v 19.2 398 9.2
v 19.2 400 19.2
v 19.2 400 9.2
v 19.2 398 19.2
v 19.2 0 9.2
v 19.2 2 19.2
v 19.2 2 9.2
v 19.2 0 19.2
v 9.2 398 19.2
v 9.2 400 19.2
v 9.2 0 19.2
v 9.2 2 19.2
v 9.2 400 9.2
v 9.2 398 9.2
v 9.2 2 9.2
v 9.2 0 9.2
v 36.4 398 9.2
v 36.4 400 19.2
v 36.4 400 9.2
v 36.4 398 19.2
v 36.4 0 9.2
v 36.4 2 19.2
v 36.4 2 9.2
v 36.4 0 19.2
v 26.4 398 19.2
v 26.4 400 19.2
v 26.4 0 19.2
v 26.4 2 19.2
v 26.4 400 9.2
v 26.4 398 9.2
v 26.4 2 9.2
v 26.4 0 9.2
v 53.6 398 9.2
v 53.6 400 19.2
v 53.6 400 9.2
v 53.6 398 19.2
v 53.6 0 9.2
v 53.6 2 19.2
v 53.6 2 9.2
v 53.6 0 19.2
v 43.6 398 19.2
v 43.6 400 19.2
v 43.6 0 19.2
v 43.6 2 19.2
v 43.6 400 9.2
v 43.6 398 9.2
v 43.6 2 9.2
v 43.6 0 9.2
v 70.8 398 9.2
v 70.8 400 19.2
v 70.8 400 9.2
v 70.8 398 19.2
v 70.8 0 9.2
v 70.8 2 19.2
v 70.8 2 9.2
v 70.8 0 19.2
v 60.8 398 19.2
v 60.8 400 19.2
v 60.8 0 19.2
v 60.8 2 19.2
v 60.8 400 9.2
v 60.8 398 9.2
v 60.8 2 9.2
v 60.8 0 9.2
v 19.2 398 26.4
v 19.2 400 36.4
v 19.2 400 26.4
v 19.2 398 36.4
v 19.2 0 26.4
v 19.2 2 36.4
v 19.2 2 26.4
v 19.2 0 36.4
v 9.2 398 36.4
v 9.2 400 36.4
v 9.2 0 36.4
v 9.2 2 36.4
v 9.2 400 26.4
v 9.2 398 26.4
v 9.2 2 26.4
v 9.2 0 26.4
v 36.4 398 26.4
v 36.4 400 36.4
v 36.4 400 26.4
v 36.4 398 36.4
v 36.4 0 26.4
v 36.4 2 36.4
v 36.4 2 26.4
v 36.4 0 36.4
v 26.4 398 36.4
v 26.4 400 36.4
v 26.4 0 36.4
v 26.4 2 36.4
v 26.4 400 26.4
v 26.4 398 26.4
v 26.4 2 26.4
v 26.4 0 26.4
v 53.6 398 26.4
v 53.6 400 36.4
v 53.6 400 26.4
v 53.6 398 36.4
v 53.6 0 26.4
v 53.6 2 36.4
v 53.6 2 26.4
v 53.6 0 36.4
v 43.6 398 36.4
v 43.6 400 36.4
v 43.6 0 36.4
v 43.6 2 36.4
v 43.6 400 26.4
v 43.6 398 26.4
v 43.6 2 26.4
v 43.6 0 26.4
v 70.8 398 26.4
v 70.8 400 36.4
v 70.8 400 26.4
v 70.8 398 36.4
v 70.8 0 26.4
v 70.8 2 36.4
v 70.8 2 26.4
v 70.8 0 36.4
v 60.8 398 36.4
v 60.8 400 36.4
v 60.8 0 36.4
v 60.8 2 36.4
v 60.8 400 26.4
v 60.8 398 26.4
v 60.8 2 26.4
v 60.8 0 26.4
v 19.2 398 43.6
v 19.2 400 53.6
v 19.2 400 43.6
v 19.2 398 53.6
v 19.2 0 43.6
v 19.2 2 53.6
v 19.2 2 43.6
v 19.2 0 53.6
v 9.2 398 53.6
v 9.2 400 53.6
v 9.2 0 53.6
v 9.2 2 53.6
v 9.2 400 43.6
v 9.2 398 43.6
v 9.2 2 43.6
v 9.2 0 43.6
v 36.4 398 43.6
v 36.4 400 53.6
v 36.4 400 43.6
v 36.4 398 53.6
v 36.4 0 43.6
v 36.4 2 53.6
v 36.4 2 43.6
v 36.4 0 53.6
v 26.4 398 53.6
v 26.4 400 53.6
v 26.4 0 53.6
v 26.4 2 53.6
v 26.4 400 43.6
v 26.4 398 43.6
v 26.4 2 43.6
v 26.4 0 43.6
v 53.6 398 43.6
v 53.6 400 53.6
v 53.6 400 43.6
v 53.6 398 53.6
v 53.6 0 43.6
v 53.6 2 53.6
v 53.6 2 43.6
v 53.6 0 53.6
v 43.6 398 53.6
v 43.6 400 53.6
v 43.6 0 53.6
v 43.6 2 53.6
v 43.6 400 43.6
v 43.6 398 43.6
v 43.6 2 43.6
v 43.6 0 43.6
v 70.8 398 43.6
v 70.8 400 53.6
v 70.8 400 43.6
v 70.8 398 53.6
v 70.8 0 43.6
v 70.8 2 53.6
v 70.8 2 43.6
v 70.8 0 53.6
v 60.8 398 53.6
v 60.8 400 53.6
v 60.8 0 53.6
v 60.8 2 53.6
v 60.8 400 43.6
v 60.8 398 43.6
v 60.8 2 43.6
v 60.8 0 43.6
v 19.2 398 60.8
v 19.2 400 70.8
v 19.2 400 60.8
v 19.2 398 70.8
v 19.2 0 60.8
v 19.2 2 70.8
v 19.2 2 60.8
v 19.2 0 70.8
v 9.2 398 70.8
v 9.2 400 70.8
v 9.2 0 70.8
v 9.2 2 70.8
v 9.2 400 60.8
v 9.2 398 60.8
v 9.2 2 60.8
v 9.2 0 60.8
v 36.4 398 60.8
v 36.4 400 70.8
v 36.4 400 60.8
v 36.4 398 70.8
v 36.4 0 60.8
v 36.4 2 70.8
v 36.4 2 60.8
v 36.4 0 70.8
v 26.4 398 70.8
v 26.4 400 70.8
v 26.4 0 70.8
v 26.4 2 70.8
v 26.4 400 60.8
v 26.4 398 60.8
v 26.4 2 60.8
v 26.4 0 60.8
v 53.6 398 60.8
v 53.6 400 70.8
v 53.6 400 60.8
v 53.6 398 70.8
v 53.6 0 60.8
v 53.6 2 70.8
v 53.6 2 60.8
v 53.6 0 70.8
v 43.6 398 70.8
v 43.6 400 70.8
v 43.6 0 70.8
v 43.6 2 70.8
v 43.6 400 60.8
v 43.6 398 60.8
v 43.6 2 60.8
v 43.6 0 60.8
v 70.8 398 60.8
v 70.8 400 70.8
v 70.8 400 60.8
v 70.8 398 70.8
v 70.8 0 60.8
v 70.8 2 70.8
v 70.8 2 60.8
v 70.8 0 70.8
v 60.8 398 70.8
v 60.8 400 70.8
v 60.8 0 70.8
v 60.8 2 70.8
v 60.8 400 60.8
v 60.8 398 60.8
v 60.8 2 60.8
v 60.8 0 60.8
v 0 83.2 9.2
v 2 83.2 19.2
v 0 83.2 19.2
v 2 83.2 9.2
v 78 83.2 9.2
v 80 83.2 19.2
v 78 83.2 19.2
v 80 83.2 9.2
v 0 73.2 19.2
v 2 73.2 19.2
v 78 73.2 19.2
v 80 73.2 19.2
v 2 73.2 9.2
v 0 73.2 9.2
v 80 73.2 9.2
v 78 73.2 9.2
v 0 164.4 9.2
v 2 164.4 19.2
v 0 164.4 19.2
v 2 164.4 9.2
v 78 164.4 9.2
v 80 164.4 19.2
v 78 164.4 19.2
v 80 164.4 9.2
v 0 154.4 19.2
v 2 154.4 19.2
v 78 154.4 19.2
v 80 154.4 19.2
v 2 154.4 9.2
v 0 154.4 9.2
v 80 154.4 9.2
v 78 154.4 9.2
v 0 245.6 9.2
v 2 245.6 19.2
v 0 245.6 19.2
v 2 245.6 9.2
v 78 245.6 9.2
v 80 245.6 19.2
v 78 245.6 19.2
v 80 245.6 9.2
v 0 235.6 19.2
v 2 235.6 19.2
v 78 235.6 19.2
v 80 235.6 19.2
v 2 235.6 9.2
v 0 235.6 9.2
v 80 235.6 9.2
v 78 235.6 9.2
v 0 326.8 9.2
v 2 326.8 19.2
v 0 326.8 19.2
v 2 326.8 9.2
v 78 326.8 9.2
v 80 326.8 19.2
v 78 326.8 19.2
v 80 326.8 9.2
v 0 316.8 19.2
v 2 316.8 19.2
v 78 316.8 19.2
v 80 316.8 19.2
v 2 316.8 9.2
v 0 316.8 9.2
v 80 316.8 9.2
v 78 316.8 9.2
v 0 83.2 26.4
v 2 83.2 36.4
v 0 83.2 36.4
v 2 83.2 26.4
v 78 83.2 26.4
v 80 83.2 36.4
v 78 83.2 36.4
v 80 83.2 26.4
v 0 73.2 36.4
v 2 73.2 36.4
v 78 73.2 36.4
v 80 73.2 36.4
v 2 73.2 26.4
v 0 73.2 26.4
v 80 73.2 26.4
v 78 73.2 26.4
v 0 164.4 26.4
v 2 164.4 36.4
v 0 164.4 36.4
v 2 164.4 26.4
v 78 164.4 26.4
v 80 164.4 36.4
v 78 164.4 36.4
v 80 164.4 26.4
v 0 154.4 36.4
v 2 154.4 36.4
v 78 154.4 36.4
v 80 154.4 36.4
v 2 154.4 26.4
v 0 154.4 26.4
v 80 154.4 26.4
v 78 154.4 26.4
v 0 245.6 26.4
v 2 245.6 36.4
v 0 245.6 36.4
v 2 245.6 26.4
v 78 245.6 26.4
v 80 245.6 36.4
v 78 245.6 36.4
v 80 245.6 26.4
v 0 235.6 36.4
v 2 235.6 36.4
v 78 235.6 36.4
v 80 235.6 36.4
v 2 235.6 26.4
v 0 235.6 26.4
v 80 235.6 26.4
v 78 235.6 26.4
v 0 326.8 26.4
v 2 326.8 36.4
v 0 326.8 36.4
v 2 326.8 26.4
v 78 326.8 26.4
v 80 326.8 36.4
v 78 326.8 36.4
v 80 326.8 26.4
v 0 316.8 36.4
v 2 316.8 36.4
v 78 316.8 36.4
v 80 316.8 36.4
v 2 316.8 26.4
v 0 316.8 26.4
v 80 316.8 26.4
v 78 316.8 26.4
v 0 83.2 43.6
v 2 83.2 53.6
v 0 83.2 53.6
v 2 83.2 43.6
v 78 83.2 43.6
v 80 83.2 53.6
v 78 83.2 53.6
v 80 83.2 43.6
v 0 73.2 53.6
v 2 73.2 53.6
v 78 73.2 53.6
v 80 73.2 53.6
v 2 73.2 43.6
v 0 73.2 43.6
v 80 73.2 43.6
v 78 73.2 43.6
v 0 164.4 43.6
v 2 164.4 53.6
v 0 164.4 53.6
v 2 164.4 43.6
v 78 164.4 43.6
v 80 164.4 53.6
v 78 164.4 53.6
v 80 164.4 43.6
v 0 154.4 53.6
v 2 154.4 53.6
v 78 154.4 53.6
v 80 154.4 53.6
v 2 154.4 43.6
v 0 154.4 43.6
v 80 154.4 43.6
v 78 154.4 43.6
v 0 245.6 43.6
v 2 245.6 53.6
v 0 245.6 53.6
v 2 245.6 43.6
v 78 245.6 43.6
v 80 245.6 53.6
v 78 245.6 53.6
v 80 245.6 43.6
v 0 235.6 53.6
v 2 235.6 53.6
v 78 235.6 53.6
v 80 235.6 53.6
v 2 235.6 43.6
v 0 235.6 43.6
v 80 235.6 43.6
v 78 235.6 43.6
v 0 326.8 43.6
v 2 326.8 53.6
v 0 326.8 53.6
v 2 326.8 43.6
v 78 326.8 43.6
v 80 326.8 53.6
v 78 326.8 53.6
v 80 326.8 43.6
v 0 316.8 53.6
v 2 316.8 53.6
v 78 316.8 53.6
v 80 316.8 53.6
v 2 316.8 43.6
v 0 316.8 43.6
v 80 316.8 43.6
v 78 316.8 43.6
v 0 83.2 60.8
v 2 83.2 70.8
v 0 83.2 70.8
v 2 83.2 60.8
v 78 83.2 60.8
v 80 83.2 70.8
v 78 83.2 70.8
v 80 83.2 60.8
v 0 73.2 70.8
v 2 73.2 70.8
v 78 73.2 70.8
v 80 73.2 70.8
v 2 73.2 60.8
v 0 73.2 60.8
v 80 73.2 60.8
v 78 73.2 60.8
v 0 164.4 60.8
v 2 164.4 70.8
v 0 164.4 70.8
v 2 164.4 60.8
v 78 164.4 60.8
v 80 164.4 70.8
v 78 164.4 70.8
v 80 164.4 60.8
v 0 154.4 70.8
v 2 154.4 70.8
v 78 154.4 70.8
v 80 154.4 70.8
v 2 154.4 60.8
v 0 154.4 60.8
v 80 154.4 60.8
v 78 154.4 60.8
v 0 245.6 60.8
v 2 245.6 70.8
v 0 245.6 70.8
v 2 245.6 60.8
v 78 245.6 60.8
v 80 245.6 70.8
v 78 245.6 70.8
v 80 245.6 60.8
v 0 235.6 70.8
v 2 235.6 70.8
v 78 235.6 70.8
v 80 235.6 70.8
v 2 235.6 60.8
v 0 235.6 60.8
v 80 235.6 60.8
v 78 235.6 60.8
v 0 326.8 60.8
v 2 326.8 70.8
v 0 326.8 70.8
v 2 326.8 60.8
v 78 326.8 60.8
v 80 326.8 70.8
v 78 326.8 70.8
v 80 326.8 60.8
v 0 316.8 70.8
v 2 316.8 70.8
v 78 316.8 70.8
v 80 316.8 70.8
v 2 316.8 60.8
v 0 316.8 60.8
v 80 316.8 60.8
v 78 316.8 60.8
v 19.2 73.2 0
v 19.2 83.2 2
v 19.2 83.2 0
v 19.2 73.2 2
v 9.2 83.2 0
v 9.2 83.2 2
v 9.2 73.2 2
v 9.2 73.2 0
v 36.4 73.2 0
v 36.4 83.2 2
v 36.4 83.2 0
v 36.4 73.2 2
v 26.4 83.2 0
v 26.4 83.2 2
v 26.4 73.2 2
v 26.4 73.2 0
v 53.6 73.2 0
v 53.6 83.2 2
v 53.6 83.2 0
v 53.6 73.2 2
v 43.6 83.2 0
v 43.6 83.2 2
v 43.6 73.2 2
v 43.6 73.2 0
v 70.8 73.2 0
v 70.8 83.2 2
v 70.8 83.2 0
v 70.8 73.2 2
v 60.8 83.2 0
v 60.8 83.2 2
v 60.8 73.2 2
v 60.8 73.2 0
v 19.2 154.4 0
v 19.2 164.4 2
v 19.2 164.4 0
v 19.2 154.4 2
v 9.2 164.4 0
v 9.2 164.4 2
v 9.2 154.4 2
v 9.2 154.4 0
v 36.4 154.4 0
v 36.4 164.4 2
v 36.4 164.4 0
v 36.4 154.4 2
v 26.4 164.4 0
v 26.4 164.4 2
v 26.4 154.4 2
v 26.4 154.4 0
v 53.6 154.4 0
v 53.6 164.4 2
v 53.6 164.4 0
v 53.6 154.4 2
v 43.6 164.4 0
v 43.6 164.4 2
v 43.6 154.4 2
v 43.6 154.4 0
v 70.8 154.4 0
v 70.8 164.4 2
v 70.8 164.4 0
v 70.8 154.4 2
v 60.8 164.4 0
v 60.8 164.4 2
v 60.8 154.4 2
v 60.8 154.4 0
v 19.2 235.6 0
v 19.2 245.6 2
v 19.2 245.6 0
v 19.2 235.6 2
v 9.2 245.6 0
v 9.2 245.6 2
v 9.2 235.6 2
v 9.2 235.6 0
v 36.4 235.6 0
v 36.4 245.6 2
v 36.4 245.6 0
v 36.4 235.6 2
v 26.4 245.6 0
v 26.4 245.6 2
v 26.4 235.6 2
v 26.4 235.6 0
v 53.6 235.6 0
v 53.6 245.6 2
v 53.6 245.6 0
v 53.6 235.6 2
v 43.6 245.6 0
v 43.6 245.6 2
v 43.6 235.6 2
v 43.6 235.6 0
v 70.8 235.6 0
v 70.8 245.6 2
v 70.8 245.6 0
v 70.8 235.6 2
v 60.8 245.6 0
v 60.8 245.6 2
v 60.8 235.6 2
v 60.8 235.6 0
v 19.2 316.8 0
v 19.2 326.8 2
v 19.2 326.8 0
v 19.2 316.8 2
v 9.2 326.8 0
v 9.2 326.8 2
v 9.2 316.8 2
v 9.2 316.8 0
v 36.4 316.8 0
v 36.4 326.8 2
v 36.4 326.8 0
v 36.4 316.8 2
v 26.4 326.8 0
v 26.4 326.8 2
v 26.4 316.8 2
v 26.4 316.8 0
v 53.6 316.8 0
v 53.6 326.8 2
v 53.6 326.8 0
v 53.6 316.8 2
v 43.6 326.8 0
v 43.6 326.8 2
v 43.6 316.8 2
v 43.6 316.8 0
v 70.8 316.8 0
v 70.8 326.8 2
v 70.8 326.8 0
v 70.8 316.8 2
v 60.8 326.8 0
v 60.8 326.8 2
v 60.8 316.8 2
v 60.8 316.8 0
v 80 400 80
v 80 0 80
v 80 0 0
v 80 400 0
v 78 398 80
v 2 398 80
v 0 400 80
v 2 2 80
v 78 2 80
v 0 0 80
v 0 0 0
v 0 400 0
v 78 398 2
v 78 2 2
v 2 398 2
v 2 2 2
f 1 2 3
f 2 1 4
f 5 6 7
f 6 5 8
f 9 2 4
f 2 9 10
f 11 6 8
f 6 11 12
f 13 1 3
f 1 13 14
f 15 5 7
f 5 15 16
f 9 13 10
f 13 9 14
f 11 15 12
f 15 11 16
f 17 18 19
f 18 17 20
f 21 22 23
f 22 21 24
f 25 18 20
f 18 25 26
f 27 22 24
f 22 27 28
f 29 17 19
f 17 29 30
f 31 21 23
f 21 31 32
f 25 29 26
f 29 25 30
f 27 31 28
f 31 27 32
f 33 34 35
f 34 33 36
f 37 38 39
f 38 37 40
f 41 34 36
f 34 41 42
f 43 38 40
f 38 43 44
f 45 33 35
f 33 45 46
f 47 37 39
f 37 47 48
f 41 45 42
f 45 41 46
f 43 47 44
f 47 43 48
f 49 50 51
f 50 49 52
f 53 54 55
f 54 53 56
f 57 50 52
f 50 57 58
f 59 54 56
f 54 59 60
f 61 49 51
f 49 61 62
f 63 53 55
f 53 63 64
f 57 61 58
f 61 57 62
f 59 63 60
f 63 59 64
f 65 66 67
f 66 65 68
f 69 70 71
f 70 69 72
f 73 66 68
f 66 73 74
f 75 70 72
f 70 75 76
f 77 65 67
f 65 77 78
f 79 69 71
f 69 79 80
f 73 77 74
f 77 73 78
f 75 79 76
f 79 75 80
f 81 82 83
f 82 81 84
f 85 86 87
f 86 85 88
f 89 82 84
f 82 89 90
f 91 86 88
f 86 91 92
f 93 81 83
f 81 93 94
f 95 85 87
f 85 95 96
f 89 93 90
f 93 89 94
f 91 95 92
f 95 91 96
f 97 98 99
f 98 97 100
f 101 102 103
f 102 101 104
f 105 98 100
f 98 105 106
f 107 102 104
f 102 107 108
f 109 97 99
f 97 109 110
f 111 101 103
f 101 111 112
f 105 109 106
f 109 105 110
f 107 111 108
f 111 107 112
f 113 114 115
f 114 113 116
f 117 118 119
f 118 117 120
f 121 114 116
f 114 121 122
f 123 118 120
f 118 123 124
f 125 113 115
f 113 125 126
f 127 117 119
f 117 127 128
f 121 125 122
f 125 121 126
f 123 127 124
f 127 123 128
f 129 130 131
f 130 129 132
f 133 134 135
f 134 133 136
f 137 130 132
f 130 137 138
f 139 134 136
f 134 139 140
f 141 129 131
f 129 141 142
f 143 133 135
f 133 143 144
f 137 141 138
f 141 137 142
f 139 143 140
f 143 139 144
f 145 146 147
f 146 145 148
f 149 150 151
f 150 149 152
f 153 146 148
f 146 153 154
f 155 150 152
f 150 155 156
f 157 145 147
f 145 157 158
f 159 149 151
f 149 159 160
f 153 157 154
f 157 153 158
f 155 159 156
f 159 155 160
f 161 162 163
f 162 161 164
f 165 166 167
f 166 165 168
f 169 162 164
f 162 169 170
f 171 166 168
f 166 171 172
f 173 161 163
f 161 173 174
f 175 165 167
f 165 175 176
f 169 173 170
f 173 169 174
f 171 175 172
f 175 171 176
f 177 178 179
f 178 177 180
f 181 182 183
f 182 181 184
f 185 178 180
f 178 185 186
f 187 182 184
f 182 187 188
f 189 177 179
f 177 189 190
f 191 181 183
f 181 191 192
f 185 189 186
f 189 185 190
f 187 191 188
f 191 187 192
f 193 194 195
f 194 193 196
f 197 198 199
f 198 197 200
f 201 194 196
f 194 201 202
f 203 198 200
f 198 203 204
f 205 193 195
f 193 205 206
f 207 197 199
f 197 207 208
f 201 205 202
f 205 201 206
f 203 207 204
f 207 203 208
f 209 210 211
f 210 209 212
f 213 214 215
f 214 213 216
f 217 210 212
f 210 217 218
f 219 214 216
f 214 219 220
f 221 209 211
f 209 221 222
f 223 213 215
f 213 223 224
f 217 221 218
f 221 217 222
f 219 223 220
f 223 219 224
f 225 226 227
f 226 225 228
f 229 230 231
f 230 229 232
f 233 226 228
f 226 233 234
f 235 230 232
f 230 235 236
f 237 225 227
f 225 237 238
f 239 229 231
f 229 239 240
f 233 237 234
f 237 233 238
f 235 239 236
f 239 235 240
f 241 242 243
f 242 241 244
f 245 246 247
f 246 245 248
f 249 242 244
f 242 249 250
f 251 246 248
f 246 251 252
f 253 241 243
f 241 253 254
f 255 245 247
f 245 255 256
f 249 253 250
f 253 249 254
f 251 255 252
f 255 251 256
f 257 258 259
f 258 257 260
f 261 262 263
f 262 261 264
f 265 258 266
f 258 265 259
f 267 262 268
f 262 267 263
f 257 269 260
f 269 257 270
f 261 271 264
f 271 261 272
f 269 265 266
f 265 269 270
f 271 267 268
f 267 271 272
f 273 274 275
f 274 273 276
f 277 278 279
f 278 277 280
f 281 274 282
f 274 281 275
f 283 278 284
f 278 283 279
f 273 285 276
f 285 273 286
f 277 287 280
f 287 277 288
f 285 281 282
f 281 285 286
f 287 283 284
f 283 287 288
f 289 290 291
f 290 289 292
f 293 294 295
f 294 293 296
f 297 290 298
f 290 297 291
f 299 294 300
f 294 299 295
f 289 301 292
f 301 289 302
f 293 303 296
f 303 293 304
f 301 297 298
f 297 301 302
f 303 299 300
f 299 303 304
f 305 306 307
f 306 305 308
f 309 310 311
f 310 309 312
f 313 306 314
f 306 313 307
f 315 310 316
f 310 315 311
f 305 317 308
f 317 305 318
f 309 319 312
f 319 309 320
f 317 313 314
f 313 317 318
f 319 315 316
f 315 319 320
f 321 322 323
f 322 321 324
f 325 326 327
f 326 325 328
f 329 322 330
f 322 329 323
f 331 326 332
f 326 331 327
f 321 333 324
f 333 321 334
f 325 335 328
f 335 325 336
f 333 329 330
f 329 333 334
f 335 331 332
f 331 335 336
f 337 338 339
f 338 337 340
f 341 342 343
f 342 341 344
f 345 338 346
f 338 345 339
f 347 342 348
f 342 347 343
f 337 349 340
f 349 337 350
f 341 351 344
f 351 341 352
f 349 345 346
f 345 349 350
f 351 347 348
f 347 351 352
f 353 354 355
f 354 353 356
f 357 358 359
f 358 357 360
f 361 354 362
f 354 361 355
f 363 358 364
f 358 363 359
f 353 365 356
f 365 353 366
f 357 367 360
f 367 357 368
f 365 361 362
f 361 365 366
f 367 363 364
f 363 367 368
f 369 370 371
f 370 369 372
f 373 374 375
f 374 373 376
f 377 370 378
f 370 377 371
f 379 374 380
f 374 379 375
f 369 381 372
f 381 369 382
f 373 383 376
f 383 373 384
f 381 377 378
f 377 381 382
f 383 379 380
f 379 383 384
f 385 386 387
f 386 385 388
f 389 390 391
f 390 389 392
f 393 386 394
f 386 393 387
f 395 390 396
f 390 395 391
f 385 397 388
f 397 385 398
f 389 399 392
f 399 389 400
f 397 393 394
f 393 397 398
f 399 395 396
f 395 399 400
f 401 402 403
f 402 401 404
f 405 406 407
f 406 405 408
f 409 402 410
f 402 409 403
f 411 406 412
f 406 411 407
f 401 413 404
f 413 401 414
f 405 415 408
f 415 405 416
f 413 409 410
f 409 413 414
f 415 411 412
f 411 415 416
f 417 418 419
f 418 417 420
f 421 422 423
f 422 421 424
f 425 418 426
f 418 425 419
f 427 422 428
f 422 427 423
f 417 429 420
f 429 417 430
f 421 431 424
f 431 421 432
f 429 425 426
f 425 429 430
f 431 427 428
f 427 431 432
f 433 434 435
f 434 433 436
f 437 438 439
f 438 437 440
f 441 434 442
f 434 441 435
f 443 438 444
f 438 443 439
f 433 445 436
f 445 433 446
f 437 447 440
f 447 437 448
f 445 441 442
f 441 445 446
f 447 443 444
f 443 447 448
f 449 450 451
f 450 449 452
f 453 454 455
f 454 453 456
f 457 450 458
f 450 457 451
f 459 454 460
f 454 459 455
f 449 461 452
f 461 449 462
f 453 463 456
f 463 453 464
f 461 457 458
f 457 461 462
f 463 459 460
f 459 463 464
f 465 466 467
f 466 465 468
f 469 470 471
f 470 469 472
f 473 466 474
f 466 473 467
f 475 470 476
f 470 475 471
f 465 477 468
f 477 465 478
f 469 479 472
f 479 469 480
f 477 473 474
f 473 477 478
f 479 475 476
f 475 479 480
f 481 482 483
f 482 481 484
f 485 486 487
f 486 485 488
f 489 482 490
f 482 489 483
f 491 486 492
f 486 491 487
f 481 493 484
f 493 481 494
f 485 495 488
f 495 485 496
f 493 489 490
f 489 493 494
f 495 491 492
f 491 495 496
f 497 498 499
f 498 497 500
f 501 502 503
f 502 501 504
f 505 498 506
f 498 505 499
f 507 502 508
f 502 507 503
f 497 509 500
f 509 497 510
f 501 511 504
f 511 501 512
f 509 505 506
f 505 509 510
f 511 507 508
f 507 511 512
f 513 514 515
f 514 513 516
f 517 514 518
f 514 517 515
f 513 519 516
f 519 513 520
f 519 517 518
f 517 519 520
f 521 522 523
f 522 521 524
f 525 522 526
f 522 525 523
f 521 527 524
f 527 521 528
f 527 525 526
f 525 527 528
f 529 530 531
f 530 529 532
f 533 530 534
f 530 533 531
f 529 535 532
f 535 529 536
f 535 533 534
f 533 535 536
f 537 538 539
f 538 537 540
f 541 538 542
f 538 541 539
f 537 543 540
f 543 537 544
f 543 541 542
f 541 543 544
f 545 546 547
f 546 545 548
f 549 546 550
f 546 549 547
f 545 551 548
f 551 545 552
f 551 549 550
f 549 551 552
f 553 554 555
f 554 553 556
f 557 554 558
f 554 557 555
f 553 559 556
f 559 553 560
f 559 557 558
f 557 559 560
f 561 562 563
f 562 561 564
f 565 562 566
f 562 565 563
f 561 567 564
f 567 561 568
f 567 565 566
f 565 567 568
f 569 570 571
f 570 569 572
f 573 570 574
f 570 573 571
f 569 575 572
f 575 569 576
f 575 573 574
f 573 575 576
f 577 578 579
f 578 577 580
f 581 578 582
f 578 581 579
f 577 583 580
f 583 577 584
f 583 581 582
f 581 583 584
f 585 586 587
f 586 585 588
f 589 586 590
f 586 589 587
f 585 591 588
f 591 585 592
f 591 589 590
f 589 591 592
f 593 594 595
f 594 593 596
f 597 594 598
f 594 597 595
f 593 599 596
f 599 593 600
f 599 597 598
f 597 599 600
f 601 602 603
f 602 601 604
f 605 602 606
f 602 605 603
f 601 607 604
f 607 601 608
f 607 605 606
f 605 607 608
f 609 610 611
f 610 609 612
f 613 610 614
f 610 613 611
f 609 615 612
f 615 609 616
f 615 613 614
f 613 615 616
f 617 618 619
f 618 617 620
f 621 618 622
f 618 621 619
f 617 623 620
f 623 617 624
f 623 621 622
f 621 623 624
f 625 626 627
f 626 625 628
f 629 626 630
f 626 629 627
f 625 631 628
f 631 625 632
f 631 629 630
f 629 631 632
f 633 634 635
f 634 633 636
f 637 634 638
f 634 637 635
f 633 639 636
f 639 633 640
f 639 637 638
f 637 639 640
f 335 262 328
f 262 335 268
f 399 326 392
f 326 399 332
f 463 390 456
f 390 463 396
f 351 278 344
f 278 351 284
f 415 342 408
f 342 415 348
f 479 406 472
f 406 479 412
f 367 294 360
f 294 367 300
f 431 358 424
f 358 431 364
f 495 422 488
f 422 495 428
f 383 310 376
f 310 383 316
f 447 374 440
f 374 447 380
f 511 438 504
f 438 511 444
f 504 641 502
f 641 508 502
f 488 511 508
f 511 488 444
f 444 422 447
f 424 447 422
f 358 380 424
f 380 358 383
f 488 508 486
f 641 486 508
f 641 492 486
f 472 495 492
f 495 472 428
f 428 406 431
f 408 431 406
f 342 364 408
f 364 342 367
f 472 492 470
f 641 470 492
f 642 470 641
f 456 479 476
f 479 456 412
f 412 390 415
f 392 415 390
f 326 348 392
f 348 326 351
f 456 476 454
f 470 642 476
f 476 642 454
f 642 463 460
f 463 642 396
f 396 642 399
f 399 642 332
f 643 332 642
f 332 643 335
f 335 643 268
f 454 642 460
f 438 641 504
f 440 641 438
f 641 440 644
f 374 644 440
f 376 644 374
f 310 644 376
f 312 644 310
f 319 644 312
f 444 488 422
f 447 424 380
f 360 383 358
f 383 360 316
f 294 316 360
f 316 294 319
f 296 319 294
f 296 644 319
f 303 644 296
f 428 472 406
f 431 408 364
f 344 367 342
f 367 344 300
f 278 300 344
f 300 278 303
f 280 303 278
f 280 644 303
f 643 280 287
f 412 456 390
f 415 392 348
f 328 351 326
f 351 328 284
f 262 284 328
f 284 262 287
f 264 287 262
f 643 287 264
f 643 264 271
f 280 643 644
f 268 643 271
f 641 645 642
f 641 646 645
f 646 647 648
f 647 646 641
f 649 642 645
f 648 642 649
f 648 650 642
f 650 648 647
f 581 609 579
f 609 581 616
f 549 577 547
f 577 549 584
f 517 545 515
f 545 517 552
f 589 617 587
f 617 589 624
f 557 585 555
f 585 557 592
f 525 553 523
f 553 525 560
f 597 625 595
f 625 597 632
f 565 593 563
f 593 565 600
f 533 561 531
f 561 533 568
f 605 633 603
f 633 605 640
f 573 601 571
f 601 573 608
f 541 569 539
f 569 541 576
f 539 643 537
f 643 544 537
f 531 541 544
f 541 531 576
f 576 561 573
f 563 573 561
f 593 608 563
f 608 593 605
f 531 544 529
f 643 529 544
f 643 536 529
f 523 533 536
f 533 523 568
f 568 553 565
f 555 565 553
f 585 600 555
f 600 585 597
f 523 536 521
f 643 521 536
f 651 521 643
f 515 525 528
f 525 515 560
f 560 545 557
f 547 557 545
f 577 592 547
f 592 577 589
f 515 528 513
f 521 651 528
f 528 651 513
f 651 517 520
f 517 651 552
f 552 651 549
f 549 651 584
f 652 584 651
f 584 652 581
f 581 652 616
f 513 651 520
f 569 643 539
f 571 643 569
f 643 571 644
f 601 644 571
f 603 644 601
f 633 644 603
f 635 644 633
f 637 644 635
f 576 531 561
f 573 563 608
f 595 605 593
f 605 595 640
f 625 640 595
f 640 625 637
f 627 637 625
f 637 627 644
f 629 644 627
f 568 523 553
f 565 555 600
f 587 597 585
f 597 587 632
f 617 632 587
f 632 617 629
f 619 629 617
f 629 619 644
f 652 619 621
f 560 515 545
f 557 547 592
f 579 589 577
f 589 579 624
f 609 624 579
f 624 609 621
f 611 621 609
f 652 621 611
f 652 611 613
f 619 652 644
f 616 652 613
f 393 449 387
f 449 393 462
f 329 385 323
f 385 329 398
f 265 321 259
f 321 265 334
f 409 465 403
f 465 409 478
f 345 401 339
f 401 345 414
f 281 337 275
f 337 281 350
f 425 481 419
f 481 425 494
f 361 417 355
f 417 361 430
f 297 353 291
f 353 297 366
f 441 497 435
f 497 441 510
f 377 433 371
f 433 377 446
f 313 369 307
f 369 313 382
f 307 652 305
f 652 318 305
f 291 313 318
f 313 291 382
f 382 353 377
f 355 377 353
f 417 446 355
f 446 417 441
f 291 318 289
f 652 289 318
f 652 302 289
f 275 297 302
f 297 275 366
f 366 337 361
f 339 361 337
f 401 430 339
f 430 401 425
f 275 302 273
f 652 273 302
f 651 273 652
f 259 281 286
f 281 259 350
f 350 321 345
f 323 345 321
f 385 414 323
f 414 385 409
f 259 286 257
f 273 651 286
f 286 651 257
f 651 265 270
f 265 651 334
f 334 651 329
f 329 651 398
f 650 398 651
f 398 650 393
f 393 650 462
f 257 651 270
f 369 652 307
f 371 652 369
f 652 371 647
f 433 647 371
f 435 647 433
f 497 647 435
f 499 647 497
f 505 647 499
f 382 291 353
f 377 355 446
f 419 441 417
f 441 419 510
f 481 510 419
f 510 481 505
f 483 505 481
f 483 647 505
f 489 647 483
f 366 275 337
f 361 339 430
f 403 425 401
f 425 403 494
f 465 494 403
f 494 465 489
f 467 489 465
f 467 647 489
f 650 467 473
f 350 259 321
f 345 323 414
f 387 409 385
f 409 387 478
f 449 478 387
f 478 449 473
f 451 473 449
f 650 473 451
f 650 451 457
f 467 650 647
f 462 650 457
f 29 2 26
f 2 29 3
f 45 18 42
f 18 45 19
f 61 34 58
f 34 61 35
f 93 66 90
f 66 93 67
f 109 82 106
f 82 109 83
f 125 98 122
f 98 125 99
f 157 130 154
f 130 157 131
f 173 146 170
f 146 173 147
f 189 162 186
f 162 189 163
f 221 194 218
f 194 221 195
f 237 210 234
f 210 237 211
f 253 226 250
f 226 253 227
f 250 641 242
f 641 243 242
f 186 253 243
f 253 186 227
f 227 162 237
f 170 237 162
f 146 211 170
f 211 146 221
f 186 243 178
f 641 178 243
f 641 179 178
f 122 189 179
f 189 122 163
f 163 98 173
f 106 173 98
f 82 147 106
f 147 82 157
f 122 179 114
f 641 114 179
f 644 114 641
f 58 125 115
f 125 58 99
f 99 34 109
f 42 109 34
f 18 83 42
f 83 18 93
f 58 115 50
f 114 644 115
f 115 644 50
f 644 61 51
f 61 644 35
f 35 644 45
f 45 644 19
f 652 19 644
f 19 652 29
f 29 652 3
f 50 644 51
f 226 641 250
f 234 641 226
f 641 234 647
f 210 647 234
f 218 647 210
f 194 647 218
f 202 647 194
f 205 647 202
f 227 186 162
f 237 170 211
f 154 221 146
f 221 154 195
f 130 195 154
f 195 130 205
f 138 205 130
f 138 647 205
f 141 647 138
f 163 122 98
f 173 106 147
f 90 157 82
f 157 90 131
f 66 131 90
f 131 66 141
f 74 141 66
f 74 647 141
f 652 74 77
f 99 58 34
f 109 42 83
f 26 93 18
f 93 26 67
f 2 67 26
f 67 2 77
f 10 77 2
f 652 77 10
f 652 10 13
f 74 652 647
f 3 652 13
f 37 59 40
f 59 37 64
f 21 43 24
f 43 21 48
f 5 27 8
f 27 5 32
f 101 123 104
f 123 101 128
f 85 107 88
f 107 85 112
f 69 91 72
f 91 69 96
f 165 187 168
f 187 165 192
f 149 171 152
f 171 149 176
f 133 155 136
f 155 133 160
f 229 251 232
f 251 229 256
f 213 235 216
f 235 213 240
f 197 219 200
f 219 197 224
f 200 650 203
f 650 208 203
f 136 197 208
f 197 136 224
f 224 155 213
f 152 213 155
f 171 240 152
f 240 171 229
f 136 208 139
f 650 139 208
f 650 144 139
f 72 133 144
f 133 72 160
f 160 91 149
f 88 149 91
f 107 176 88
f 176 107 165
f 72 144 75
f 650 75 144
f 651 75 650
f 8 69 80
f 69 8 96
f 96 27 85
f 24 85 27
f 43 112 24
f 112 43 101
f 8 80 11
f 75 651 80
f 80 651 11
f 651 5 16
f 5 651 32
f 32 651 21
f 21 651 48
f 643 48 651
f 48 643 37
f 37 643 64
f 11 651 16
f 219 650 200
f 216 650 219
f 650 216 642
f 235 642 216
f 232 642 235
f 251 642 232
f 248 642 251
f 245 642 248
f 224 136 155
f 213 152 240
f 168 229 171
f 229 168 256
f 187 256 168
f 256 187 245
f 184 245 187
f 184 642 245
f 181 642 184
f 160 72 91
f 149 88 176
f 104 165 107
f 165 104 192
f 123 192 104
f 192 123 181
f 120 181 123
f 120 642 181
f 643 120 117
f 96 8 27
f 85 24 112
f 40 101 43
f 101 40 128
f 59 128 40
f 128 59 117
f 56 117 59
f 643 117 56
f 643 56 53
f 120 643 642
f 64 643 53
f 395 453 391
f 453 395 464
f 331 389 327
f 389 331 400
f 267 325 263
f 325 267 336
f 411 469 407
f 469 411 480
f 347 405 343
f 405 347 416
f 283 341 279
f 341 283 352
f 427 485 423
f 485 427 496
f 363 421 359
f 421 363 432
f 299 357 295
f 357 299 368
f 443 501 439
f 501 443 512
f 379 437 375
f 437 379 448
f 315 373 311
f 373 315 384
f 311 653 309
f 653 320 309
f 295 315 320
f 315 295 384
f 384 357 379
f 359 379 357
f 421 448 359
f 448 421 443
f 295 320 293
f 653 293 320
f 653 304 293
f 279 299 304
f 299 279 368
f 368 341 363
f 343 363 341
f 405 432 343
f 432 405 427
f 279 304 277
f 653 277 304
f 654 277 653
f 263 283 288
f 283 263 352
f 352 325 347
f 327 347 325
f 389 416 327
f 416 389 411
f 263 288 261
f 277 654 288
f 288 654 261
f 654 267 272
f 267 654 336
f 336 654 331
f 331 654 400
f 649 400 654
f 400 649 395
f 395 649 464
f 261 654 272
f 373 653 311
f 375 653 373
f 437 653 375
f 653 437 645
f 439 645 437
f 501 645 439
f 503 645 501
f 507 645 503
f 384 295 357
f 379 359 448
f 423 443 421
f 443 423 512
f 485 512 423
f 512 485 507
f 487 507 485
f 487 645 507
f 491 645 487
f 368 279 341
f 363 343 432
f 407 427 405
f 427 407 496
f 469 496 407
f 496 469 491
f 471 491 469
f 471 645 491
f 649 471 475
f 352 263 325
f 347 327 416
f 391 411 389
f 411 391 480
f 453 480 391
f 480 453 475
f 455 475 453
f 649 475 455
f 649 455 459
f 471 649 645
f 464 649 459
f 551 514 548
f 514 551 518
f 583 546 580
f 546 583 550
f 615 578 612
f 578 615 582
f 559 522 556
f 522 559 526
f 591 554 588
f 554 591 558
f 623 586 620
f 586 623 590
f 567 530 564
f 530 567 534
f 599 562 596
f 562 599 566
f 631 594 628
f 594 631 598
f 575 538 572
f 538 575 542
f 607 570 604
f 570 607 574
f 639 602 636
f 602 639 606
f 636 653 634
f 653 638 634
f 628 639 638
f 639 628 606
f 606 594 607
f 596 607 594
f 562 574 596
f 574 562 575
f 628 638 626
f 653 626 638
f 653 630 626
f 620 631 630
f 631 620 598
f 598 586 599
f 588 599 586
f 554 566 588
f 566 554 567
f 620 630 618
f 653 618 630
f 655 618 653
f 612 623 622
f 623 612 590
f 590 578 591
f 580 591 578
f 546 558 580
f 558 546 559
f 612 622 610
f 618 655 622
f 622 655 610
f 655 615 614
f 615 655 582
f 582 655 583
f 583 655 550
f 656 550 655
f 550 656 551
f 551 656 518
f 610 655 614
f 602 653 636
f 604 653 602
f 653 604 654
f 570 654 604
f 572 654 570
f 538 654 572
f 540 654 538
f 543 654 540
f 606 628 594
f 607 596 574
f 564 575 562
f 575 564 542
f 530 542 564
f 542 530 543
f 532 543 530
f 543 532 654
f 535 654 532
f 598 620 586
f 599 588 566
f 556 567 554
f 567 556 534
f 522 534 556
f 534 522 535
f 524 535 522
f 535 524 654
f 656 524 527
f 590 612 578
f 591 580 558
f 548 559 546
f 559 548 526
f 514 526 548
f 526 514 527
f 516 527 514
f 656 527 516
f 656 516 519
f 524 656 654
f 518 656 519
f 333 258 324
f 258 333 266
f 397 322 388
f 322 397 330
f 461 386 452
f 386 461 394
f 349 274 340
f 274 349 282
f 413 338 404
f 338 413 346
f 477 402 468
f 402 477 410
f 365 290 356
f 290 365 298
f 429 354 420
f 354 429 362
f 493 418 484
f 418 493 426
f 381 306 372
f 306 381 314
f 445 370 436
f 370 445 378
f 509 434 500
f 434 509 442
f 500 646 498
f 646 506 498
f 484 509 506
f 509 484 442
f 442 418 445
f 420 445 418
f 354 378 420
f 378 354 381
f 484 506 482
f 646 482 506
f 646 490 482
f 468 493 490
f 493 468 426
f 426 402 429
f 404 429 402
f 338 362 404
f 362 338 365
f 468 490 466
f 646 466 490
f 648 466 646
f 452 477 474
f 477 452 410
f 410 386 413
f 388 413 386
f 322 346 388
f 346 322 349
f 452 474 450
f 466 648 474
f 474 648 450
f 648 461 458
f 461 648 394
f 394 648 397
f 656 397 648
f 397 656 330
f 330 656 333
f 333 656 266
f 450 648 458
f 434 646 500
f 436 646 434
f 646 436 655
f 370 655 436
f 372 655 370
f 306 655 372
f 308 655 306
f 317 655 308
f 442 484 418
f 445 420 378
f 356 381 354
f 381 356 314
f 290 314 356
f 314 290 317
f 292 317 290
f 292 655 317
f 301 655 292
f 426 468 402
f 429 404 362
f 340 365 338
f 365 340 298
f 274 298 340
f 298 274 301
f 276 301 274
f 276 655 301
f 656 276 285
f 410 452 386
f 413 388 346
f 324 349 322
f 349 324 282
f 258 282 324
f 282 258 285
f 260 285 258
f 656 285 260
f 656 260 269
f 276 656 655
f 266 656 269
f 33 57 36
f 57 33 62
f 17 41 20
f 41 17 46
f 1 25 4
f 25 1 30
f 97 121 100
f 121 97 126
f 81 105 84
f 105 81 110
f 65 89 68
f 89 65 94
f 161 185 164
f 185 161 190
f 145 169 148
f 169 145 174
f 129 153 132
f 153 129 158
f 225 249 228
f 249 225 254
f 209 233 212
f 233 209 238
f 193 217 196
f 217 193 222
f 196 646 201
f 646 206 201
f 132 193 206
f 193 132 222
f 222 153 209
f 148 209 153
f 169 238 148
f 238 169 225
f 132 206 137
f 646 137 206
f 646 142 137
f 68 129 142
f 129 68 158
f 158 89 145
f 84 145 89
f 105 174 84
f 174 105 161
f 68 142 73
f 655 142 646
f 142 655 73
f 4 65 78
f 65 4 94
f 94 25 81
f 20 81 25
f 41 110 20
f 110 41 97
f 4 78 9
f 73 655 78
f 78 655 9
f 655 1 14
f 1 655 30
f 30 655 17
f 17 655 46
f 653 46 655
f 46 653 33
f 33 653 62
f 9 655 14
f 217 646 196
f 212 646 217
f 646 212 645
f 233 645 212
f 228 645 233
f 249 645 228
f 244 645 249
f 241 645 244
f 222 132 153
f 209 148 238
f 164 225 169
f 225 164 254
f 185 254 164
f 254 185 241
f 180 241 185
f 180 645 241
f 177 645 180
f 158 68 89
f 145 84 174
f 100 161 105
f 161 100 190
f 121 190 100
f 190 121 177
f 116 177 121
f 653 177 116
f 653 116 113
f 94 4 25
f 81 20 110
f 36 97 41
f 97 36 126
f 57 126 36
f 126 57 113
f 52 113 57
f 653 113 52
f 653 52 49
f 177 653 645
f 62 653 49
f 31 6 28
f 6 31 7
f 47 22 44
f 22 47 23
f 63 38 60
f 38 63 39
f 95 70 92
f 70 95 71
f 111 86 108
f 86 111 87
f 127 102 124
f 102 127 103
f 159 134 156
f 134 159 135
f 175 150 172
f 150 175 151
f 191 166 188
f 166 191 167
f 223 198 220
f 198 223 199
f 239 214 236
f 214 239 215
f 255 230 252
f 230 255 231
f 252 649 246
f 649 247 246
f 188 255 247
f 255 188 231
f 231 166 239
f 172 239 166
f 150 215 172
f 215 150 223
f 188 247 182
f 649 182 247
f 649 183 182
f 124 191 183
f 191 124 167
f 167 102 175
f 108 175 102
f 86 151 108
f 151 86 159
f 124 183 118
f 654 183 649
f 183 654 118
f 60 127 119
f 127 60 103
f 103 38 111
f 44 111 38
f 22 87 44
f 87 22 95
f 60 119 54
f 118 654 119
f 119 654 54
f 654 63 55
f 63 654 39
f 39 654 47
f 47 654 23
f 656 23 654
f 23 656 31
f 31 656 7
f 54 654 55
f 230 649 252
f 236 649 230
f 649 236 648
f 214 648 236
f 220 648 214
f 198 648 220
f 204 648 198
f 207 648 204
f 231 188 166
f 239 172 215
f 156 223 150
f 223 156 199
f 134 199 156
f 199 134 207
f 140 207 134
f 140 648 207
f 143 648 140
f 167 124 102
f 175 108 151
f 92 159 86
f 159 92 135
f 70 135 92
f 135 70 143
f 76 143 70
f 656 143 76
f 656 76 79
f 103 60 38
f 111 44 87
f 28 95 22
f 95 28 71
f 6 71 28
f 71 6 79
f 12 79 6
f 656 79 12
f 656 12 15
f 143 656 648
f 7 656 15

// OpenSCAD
// Main solid dimensions
CubeWidth=80;
CubeDepth=400;
CubeHeight=80;
BorderWidth=2;

// Choose on which faces you want the holes. 1 for YES and 0 for NO
HolesFront=1;
HolesLateral=1;
HolesBottom=1;

// Holes in the main solid
HoleWidth=10;
HoleHeight=10;
HorizontalHoleNumber=4;
VerticalHoleNumber=4;

// Calculates space among holes
WidthSpace=((CubeWidth - BorderWidth * 2) - (HoleWidth * HorizontalHoleNumber)) /(HorizontalHoleNumber + 1) ;
DepthSpace=((CubeDepth - BorderWidth * 2) - (HoleWidth * HorizontalHoleNumber)) /(HorizontalHoleNumber + 1) ;
HeightSpace=((CubeHeight - BorderWidth * 2) - (HoleHeight * VerticalHoleNumber)) / (VerticalHoleNumber + 1);


echo("");
echo("");
echo (DepthSpace);
echo("");
echo("");

// Draw the solid
difference () {

	// Draw main solid
	cube ([CubeWidth, CubeDepth, CubeHeight]);
	// Empty main solid with a smaller inner solid
	translate ([BorderWidth, BorderWidth, BorderWidth])
	cube ([CubeWidth-2*BorderWidth, CubeDepth-2*BorderWidth, CubeHeight*1.5]);

	// Front and back holes
	if (HolesFront==1){
		for (z = [0 : VerticalHoleNumber - 1])
		{
		for (x = [0 : HorizontalHoleNumber -1 ])
		{
		translate ([BorderWidth + WidthSpace + (HoleWidth + WidthSpace) * x , -10, BorderWidth +  HeightSpace + (HoleHeight + HeightSpace) * z])
		cube ([HoleWidth, CubeDepth * 1.4, HoleHeight]);
		}
		}
	}
	
	// Lateral holes
	if (HolesLateral==1) {
		rotate ([0,0,90])
		translate ([0, -CubeWidth * 1.2, 0])
		for (z = [0 : VerticalHoleNumber - 1])
		{
		for (x = [0 : HorizontalHoleNumber -1 ])
		{
		translate ([BorderWidth + DepthSpace + (HoleWidth + DepthSpace) * x, -10, BorderWidth +  HeightSpace + (HoleHeight + HeightSpace) * z])
		cube ([HoleWidth, CubeWidth * 1.4, HoleHeight]);
		}
		}
	}

	// Bottom holes
	if (HolesBottom==1){
		rotate ([-90,0,0])
		translate ([0, -CubeWidth * 1.2, 0])
		for (z = [0 : HorizontalHoleNumber - 1])
		{
		for (x = [0 : HorizontalHoleNumber -1 ])
		{
		translate ([BorderWidth + WidthSpace + (HoleWidth + WidthSpace) * x , -10, BorderWidth +  DepthSpace + (HoleHeight + DepthSpace) * z])
		cube ([HoleWidth, CubeWidth * 1.4, HoleHeight]);
		}
		}
	}

}
